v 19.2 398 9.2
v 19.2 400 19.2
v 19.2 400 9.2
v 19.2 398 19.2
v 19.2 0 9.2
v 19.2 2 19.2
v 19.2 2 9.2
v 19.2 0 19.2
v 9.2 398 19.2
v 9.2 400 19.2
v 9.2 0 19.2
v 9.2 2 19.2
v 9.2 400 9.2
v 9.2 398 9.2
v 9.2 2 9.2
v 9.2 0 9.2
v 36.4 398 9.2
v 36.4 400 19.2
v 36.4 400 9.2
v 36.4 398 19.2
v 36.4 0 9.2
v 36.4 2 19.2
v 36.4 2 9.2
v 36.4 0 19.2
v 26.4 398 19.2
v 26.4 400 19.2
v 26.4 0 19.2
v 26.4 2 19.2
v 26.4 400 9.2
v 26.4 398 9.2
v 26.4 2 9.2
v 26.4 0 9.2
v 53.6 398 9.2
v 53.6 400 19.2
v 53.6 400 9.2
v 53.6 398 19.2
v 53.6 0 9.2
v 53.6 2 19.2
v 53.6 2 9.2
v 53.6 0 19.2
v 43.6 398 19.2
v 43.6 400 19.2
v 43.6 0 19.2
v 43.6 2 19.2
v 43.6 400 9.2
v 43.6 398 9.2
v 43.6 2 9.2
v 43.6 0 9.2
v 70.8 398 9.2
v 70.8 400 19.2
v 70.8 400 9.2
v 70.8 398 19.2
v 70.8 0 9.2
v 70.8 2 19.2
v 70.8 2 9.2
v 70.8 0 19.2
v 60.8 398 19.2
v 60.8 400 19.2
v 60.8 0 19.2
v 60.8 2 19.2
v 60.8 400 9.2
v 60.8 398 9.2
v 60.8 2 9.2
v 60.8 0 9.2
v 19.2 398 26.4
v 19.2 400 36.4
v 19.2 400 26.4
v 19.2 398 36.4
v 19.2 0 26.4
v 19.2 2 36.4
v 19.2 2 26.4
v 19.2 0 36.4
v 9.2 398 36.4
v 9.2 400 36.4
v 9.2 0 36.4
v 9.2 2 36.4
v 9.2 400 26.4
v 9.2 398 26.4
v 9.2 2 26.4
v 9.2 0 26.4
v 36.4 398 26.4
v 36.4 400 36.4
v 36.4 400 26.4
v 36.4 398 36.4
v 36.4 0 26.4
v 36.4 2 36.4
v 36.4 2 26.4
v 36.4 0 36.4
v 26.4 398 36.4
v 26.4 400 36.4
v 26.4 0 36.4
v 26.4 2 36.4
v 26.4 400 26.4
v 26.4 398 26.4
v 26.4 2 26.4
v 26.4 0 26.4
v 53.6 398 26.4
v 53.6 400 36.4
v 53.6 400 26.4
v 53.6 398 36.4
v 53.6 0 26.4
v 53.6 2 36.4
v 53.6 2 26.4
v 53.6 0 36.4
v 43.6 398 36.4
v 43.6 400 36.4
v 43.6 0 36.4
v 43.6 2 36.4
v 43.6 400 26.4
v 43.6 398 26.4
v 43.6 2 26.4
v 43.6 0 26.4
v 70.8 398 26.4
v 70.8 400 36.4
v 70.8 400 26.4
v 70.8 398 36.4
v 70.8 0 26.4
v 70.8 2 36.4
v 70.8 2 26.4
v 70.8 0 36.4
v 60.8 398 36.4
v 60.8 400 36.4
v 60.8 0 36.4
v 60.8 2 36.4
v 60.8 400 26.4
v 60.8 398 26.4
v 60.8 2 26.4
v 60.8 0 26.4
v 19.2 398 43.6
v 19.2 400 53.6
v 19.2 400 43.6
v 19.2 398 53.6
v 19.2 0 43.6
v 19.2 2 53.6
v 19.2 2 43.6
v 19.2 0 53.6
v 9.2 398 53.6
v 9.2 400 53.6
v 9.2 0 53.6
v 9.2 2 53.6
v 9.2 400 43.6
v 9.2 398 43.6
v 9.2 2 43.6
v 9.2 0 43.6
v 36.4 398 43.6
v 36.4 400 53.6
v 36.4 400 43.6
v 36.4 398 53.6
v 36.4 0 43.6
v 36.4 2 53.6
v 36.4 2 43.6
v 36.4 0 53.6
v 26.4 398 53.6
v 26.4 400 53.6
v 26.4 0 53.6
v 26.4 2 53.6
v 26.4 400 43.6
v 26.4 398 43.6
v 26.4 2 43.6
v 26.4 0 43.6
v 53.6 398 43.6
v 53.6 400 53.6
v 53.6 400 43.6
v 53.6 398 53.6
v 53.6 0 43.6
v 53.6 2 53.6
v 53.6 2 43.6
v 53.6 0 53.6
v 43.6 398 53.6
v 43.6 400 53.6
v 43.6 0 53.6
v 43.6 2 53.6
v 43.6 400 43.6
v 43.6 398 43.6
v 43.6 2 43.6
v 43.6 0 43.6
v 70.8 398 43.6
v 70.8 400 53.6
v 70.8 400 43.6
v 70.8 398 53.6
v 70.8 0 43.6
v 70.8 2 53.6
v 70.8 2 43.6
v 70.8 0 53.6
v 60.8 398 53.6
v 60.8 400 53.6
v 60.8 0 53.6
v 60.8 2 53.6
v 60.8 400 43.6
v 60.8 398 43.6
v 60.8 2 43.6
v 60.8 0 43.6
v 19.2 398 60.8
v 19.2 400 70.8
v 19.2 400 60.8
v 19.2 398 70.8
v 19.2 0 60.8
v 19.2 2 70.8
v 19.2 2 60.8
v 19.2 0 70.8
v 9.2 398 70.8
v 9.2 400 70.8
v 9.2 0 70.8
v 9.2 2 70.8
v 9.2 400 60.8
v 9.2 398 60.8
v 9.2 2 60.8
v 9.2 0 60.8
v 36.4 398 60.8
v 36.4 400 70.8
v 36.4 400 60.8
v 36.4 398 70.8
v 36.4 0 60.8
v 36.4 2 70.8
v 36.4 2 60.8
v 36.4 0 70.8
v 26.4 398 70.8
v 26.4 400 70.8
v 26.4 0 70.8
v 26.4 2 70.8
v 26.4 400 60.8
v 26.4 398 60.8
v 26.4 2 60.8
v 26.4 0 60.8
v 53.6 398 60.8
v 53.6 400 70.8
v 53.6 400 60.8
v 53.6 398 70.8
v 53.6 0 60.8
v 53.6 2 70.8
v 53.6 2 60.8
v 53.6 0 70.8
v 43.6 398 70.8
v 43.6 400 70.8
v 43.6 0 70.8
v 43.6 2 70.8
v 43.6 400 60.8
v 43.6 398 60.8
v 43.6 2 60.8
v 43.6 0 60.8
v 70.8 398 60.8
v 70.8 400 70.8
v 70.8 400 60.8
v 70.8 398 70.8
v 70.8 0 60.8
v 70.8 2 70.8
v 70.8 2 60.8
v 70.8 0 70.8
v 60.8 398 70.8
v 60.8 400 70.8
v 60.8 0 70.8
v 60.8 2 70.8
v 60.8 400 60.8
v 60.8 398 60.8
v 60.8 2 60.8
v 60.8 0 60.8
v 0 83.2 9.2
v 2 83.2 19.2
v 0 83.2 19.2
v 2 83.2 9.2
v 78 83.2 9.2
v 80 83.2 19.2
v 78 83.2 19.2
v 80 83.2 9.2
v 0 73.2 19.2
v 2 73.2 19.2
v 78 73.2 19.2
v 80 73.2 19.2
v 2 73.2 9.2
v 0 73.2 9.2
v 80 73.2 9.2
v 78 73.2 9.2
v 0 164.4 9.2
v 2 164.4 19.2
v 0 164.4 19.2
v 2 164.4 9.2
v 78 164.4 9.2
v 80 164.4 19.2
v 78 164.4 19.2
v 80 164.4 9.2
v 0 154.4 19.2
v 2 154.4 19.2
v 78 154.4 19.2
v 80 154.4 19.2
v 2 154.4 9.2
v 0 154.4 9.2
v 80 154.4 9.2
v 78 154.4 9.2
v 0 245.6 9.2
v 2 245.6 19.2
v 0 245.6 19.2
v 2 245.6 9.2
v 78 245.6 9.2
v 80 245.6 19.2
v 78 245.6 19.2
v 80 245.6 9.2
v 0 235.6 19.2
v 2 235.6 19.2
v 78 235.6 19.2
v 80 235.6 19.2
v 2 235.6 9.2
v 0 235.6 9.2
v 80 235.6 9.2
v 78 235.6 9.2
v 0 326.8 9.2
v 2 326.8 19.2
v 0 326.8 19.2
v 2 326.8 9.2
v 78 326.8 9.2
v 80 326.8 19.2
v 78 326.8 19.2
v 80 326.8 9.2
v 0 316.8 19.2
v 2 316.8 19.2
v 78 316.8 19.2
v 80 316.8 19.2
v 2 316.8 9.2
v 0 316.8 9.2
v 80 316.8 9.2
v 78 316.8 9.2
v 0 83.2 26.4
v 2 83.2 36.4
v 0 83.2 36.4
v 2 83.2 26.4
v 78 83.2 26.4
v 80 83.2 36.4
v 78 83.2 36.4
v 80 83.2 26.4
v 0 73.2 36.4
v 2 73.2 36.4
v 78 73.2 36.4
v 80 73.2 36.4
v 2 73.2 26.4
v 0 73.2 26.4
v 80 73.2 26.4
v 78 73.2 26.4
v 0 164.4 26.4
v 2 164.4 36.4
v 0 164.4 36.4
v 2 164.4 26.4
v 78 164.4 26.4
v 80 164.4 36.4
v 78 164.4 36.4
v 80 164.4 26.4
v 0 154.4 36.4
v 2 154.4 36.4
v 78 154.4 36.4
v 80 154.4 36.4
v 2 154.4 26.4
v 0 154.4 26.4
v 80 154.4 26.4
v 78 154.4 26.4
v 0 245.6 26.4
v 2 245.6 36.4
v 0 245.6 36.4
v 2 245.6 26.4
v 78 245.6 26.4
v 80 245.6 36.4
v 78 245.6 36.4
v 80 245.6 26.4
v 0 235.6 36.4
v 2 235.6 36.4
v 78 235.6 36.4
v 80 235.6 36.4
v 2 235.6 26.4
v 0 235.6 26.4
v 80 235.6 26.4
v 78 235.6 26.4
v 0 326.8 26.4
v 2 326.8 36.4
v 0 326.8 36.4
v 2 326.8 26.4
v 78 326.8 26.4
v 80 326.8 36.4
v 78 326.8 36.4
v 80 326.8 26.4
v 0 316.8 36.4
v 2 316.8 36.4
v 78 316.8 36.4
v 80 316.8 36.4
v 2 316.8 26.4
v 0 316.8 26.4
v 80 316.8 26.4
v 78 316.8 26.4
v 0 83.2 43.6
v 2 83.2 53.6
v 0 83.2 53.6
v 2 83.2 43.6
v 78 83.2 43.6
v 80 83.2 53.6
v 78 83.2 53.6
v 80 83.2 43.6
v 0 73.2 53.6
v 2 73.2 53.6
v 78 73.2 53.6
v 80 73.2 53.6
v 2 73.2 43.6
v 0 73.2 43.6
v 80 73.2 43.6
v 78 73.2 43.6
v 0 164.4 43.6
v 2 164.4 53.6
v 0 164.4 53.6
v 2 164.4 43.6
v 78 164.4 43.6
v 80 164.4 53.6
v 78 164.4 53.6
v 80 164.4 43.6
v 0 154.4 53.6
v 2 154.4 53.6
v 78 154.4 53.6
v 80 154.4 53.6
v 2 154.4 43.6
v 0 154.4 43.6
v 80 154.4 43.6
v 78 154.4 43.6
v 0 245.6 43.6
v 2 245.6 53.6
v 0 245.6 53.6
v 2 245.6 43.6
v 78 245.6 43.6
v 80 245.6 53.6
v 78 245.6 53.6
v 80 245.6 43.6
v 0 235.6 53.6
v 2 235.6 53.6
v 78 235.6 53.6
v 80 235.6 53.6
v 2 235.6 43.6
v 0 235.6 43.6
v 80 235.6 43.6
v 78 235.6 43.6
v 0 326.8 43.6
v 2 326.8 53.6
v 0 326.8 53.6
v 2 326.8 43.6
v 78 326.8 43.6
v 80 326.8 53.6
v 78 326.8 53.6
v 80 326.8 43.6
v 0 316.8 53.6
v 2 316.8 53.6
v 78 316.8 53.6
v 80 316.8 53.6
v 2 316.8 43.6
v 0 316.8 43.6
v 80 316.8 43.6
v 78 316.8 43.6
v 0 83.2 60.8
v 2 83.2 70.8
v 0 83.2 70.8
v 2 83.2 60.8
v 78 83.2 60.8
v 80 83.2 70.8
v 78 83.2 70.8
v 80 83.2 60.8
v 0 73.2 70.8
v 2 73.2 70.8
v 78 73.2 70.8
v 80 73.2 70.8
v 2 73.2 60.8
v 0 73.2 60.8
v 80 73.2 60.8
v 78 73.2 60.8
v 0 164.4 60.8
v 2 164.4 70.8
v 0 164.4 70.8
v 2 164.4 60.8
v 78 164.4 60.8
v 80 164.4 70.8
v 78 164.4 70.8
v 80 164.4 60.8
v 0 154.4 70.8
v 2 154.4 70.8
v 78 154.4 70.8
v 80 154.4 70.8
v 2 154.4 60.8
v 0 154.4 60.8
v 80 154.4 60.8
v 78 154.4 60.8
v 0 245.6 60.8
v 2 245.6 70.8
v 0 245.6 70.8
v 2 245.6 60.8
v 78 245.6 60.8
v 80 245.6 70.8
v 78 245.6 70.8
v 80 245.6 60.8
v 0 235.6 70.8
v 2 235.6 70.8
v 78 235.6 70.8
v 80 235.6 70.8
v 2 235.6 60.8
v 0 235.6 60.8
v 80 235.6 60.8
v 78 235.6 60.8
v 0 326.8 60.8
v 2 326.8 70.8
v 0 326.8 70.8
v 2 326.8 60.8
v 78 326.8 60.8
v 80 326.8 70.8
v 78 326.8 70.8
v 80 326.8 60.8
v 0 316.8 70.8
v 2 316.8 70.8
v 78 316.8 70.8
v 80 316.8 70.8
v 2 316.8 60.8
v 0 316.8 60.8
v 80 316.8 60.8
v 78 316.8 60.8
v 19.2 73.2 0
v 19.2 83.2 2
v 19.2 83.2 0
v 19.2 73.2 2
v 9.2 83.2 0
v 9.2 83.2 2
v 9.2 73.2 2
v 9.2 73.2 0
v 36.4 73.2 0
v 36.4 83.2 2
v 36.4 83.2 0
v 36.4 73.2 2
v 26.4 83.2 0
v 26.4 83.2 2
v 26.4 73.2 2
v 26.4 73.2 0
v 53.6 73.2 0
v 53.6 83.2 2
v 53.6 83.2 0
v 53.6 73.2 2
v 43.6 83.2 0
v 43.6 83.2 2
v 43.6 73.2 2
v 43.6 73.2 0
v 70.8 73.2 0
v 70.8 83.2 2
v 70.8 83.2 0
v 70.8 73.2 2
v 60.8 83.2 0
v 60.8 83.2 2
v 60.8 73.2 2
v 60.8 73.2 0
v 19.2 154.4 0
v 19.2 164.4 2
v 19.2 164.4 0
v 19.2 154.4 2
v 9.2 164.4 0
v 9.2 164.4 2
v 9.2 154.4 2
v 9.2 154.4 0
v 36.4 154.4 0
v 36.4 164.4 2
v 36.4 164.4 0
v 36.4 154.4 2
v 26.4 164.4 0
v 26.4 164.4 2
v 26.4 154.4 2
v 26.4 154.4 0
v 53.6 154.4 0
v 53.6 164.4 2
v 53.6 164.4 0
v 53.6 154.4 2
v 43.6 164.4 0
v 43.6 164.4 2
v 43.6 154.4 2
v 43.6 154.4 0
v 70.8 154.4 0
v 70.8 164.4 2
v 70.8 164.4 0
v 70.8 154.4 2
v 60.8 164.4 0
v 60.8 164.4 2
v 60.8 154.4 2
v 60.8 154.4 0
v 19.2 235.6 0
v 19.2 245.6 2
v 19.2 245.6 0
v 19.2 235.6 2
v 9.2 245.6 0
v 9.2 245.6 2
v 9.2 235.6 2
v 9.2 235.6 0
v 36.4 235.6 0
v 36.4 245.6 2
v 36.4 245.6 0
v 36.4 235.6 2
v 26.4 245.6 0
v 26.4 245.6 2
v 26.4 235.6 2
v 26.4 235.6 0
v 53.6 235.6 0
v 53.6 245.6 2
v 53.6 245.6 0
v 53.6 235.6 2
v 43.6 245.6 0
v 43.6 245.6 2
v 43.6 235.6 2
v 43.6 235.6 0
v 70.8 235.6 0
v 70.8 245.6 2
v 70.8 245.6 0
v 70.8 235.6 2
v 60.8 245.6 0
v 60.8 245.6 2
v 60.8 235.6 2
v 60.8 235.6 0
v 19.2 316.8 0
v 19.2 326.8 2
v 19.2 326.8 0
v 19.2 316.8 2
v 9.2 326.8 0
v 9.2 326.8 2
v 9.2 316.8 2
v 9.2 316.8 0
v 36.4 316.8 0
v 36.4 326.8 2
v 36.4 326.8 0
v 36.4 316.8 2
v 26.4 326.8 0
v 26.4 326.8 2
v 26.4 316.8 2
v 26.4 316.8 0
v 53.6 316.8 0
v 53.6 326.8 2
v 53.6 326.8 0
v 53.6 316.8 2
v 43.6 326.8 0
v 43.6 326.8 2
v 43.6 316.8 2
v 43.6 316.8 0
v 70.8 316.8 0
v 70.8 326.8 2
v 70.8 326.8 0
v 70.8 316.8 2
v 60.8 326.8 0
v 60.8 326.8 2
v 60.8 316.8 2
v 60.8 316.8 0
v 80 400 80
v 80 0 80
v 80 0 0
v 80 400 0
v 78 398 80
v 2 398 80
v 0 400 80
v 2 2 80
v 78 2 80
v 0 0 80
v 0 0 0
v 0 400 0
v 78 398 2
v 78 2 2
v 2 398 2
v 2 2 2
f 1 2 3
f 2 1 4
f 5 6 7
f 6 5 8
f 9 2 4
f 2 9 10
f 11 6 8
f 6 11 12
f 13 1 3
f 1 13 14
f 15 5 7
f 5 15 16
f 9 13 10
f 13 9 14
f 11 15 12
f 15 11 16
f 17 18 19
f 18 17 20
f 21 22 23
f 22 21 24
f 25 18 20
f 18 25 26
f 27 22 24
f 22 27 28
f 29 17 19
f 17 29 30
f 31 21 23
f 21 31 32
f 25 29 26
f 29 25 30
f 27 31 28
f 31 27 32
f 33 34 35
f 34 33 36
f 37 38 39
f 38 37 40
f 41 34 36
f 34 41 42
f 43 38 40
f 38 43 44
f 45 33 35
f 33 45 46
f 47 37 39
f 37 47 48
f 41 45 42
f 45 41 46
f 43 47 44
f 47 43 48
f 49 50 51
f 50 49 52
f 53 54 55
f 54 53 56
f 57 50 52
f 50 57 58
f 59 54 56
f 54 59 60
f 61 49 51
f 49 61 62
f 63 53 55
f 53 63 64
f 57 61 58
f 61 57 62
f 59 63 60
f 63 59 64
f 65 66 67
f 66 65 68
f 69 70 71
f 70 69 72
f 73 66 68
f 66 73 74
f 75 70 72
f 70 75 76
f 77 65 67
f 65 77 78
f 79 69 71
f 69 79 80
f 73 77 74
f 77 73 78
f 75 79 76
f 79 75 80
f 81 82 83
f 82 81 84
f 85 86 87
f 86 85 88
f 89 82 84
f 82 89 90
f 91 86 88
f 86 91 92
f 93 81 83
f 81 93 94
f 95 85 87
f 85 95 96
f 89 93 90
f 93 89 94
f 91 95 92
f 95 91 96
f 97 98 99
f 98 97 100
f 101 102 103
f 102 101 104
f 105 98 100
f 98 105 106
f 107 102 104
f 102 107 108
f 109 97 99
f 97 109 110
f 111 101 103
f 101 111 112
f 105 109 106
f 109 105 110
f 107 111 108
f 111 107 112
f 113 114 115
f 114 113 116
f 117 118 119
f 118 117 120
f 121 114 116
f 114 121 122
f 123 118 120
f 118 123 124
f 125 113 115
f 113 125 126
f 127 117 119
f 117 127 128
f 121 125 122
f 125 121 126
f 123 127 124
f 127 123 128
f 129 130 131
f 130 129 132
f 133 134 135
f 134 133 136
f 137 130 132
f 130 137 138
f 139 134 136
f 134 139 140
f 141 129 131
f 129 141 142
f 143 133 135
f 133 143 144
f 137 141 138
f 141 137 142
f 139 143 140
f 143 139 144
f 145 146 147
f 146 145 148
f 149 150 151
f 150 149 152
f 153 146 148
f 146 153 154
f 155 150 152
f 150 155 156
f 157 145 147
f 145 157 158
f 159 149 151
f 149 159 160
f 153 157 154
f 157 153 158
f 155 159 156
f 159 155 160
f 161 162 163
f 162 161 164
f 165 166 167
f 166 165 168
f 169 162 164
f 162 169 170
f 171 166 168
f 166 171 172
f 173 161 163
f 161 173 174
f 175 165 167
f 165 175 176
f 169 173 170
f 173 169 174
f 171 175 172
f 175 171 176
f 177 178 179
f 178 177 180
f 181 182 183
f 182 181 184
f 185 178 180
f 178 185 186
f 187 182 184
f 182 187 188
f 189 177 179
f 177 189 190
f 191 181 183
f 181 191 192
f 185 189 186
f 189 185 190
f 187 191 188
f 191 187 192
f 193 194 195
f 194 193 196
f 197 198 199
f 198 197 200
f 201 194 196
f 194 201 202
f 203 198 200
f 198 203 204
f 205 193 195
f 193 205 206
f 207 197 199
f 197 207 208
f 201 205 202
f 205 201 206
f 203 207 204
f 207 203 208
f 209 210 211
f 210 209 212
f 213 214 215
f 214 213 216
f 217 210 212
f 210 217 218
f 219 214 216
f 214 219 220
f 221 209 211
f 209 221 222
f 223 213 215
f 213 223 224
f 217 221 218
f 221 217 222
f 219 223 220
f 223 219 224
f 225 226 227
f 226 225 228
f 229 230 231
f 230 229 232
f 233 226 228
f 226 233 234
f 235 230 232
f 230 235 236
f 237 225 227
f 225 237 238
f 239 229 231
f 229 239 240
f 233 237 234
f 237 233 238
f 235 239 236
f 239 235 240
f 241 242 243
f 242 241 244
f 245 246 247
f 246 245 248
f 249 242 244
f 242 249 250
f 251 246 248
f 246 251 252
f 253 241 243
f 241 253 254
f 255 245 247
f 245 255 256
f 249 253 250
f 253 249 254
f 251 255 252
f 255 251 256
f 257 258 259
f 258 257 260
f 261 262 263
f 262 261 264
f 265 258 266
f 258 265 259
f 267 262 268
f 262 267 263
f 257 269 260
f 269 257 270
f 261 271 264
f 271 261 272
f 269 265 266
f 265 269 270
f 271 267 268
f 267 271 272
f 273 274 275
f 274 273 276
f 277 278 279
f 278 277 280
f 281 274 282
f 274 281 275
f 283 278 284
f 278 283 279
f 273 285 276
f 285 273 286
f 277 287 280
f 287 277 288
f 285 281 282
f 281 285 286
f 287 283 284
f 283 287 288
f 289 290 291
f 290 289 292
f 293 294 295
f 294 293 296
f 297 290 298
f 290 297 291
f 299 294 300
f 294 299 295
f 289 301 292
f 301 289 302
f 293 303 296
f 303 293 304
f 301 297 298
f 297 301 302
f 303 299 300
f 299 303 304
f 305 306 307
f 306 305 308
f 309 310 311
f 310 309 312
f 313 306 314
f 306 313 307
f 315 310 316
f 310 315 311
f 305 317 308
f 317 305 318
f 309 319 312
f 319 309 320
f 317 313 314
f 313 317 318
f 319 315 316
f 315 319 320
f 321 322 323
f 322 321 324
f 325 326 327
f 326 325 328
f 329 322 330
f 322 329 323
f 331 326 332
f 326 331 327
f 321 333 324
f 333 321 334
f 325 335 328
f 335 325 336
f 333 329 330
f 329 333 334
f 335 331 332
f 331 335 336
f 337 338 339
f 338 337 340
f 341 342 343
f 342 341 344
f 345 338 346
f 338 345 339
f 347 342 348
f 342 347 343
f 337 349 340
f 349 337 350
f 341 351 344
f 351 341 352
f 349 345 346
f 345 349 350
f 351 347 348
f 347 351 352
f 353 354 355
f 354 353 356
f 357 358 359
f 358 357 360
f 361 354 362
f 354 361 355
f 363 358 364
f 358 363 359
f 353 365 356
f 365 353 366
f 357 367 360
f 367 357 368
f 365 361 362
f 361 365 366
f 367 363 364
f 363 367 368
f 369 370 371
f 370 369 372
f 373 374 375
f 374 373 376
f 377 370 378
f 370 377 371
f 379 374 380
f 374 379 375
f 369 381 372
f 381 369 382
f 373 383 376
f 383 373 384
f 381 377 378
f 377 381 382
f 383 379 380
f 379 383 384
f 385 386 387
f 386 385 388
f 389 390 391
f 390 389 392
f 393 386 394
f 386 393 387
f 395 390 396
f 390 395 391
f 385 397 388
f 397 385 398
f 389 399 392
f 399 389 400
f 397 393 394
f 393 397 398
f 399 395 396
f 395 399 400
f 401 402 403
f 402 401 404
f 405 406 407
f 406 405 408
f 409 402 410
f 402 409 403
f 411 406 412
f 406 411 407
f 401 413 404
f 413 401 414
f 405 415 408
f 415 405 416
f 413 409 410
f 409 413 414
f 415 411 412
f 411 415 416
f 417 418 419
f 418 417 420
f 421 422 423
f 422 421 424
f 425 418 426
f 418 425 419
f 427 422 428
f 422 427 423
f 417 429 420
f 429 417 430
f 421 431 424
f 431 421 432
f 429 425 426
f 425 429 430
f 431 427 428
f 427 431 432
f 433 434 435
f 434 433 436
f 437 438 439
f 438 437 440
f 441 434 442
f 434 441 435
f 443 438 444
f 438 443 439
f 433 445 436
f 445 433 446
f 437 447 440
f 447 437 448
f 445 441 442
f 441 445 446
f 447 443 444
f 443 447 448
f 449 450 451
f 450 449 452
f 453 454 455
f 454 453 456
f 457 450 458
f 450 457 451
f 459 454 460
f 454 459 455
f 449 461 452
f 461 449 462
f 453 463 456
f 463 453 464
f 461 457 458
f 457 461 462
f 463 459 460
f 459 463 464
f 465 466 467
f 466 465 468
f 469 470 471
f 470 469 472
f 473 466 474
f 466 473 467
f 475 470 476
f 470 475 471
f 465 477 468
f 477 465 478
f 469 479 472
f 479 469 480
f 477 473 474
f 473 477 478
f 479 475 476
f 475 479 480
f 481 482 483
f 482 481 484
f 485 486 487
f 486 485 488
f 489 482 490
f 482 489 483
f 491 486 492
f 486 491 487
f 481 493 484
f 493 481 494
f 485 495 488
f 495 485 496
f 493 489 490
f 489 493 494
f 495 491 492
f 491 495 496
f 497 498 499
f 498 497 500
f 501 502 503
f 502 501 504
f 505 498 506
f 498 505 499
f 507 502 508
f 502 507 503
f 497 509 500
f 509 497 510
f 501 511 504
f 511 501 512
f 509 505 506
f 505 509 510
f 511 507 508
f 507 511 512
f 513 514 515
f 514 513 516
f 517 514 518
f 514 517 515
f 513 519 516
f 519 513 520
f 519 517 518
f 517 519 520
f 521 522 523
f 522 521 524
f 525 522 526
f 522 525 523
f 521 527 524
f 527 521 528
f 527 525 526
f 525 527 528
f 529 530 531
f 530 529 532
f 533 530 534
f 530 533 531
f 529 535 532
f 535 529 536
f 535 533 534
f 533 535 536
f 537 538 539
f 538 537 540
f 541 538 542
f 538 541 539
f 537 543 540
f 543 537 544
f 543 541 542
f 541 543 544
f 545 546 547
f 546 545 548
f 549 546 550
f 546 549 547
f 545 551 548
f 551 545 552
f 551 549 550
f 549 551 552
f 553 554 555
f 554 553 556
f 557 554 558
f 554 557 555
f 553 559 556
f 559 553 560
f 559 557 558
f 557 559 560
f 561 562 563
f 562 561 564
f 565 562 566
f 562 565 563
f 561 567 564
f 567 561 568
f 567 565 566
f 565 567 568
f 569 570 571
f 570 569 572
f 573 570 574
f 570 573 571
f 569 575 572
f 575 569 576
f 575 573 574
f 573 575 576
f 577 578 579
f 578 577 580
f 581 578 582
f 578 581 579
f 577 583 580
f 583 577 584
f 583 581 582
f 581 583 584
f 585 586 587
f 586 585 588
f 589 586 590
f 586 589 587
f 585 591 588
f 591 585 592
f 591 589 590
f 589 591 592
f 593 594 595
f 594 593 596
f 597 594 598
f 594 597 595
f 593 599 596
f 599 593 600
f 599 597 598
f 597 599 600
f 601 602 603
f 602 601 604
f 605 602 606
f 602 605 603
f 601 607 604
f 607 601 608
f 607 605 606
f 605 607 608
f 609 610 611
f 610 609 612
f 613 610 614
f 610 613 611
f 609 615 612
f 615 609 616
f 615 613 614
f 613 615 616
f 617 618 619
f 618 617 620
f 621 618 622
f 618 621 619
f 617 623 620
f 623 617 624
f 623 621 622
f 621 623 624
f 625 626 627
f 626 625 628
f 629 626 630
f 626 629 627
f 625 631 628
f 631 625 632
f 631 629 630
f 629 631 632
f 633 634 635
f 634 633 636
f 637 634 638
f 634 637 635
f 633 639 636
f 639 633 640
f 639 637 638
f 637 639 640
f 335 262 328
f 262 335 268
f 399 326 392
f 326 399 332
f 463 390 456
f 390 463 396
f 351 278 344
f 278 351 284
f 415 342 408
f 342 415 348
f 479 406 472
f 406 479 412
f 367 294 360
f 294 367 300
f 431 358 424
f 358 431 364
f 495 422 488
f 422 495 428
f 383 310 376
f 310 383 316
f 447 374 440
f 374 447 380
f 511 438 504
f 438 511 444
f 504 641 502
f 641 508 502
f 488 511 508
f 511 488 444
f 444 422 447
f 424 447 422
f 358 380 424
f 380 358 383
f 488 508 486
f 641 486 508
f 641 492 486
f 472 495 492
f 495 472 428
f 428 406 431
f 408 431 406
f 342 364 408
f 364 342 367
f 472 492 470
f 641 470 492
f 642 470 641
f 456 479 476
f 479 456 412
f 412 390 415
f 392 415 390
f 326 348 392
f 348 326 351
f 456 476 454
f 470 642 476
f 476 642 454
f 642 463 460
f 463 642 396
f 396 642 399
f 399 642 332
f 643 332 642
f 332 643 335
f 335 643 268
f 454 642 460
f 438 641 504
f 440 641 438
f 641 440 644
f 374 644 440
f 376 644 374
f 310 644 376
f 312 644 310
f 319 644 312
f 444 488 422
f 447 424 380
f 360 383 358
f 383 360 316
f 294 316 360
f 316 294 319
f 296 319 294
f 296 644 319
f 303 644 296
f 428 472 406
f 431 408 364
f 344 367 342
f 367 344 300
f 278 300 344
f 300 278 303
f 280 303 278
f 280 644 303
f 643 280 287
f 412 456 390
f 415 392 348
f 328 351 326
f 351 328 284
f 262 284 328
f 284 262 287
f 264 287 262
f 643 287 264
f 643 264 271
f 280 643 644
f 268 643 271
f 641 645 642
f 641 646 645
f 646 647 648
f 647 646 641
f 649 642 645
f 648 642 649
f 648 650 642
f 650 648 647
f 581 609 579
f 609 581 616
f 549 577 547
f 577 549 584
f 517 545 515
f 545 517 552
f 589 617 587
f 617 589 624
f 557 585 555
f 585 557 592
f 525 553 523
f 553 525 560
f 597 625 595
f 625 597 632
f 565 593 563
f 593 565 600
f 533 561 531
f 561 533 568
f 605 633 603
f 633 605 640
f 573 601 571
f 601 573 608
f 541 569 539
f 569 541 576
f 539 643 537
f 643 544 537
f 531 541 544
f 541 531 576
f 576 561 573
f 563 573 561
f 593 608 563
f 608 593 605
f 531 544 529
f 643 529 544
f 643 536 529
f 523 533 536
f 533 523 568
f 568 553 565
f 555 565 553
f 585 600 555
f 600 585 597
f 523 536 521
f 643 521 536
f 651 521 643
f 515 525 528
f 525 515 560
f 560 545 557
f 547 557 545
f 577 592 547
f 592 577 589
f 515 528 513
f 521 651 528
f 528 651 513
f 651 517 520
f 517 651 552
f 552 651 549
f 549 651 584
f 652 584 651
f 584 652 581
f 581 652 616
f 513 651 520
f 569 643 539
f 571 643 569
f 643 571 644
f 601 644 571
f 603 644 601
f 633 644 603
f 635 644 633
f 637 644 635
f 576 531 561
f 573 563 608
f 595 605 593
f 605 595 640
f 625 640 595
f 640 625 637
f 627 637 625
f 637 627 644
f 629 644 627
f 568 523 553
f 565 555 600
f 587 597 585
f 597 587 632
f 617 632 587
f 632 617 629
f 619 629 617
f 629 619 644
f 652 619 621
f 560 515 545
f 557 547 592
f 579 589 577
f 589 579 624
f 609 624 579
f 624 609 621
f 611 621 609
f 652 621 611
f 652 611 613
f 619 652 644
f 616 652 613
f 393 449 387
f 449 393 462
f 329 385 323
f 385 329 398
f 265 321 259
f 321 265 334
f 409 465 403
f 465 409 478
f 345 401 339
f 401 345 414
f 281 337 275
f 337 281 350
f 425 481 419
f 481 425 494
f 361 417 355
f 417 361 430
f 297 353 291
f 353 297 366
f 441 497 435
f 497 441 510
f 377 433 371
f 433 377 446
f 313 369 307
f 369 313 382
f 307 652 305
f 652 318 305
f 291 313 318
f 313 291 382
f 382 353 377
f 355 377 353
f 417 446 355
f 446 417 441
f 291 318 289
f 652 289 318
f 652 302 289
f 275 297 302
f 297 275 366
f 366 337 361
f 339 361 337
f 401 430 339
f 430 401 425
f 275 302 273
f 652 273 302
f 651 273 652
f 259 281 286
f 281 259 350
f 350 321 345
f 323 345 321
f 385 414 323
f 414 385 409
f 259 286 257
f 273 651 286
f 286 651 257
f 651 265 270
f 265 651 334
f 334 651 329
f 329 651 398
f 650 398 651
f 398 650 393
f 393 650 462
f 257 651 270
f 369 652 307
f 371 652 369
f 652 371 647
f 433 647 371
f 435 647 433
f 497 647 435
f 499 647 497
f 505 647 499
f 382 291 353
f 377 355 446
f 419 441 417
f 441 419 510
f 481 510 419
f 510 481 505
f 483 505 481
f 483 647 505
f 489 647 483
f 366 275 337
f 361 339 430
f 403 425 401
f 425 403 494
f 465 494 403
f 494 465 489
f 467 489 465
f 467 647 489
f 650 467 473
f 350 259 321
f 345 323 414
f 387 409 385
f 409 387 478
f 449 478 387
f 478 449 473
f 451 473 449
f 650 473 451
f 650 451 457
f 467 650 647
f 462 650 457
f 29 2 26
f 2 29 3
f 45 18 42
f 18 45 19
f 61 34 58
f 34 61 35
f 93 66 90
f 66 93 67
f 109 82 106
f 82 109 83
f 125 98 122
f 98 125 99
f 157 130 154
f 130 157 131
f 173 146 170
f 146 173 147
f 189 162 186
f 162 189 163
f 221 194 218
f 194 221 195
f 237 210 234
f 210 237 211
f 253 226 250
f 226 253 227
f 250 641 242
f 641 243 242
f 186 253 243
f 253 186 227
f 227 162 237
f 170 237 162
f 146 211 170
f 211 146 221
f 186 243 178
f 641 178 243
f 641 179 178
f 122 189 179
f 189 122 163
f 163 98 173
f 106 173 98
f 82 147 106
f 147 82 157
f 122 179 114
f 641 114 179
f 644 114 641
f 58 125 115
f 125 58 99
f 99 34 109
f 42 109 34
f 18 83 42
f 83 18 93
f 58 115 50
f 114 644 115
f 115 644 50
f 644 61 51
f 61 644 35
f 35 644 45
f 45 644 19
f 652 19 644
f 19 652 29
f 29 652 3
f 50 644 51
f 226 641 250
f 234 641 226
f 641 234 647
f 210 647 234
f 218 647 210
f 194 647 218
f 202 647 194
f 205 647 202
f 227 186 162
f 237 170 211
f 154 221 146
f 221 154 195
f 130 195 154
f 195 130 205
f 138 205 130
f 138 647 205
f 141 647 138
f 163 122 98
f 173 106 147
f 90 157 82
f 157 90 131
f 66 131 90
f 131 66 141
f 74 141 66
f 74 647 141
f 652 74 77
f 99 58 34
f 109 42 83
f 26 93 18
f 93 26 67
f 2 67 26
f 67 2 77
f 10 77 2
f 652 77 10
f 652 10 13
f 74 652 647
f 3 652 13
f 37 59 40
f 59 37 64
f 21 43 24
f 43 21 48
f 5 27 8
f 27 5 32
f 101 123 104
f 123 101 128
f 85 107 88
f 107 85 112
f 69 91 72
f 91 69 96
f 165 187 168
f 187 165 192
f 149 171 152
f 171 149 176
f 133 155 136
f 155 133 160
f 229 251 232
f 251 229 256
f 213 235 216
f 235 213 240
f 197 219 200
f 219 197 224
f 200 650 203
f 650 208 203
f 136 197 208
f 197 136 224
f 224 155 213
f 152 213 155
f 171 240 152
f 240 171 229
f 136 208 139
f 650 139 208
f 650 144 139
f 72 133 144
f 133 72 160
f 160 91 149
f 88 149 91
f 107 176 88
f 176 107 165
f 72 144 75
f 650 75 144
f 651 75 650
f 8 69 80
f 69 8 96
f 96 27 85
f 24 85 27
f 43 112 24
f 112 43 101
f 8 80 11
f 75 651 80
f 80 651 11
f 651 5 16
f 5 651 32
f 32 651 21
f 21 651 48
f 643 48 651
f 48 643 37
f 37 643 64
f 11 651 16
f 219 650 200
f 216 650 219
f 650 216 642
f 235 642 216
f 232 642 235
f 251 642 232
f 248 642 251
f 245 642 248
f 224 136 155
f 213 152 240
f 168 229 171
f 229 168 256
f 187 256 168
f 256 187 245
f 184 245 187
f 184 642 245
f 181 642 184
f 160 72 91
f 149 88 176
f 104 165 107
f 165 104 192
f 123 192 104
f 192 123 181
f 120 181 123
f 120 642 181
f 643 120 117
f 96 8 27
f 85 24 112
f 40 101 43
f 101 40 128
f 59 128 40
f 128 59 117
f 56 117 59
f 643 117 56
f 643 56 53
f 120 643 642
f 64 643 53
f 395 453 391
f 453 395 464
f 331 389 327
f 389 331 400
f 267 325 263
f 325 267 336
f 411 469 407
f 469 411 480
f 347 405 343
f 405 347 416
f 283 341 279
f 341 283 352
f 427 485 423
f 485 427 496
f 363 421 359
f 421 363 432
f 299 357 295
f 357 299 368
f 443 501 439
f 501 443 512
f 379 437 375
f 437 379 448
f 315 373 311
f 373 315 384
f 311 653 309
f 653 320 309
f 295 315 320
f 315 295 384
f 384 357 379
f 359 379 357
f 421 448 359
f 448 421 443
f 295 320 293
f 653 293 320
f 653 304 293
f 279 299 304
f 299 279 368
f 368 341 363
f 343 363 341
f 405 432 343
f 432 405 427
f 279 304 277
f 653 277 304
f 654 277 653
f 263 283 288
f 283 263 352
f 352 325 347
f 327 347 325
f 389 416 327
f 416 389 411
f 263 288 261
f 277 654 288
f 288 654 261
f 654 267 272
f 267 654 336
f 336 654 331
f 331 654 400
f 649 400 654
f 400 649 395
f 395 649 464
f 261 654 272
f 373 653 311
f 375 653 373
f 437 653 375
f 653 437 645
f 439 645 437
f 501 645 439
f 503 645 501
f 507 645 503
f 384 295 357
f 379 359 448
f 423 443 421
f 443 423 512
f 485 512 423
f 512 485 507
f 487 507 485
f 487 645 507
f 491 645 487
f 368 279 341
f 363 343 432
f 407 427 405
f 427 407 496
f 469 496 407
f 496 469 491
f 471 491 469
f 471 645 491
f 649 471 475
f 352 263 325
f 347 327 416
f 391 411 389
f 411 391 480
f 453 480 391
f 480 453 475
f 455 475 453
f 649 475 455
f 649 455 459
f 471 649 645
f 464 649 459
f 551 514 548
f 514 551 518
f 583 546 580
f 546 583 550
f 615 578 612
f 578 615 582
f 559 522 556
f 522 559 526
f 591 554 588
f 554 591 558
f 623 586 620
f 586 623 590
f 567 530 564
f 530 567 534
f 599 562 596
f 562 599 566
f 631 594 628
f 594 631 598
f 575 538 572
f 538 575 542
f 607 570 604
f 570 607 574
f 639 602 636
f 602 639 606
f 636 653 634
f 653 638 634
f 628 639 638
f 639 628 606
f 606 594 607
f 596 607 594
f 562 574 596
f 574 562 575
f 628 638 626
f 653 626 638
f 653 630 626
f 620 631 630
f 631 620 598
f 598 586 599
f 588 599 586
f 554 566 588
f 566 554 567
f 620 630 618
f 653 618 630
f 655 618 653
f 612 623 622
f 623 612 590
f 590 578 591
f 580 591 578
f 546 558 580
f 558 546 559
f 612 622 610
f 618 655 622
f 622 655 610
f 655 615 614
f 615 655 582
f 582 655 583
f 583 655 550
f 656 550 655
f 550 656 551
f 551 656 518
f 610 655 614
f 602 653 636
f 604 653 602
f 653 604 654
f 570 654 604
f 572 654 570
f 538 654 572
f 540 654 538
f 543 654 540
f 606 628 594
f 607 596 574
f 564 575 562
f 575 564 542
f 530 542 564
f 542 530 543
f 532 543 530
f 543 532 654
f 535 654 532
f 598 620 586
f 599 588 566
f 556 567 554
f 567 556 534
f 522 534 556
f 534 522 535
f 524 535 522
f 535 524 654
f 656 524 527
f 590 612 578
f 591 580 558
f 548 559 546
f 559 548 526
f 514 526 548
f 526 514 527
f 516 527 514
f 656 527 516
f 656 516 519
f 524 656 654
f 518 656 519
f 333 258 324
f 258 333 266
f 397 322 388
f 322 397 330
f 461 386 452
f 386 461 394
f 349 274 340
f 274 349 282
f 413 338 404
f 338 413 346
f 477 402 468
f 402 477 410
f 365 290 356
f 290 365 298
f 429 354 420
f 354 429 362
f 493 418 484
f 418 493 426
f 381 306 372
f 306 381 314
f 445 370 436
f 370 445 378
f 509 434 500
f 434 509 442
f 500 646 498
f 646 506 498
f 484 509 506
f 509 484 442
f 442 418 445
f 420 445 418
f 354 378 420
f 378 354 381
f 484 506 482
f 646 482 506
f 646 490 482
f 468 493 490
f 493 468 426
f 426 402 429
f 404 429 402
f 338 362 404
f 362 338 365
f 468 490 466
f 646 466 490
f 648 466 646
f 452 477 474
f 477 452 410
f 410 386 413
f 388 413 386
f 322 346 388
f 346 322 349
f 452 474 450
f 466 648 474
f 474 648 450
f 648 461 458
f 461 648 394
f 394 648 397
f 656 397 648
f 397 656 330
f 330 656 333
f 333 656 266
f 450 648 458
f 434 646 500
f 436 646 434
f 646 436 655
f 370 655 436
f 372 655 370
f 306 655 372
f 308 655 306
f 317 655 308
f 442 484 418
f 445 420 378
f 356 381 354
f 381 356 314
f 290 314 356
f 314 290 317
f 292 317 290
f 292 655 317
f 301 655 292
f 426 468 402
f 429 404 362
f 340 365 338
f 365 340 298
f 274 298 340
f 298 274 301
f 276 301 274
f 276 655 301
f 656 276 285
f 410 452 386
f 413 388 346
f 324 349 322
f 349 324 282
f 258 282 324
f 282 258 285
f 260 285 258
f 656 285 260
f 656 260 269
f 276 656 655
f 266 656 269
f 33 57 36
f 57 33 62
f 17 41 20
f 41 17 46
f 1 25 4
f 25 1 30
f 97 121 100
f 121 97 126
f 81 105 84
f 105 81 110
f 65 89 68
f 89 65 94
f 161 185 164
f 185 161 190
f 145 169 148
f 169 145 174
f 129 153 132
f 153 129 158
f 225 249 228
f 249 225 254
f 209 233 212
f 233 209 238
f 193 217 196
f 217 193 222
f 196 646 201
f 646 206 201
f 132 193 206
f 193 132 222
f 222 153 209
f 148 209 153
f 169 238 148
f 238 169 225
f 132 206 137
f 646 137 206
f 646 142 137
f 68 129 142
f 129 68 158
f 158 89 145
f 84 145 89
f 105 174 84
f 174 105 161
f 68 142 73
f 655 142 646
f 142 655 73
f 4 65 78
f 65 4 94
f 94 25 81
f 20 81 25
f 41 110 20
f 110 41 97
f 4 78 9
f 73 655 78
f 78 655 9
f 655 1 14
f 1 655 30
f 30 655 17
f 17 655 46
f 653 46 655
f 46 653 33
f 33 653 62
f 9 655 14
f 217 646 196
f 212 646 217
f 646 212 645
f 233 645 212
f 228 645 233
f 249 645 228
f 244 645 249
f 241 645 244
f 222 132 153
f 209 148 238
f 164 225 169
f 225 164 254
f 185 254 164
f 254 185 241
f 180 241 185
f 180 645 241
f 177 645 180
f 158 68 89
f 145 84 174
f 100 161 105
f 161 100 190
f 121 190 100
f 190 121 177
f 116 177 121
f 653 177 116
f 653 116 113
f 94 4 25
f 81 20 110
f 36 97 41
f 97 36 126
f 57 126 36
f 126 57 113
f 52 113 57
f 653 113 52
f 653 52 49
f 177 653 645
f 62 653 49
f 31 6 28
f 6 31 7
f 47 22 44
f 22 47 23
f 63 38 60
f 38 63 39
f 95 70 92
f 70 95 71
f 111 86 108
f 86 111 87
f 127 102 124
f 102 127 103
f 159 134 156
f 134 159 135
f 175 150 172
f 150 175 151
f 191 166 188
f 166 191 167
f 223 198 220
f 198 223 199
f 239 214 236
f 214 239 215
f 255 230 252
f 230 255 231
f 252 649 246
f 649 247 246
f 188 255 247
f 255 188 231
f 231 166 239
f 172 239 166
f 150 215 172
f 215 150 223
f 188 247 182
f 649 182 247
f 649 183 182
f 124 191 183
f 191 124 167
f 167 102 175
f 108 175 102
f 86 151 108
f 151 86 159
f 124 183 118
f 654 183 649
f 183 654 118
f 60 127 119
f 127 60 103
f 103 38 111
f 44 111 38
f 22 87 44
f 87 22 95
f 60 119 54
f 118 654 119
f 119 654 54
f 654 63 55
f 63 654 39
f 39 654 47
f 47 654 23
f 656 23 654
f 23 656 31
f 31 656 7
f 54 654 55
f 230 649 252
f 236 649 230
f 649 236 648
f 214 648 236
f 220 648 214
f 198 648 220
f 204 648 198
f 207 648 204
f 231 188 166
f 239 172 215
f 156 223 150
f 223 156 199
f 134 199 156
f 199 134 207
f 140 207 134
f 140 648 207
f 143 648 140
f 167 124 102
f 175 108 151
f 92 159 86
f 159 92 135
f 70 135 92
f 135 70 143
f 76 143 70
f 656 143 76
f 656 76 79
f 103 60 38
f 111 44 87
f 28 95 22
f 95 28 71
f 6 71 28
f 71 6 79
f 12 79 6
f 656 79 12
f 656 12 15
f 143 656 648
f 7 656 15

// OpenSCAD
// Main solid dimensions
CubeWidth=80;
CubeDepth=400;
CubeHeight=80;
BorderWidth=2;

// Choose on which faces you want the holes. 1 for YES and 0 for NO
HolesFront=1;
HolesLateral=1;
HolesBottom=1;

// Holes in the main solid
HoleWidth=10;
HoleHeight=10;
HorizontalHoleNumber=4;
VerticalHoleNumber=4;

// Calculates space among holes
WidthSpace=((CubeWidth - BorderWidth * 2) - (HoleWidth * HorizontalHoleNumber)) /(HorizontalHoleNumber + 1) ;
DepthSpace=((CubeDepth - BorderWidth * 2) - (HoleWidth * HorizontalHoleNumber)) /(HorizontalHoleNumber + 1) ;
HeightSpace=((CubeHeight - BorderWidth * 2) - (HoleHeight * VerticalHoleNumber)) / (VerticalHoleNumber + 1);


echo("");
echo("");
echo (DepthSpace);
echo("");
echo("");

// Draw the solid
difference () {

	// Draw main solid
	cube ([CubeWidth, CubeDepth, CubeHeight]);
	// Empty main solid with a smaller inner solid
	translate ([BorderWidth, BorderWidth, BorderWidth])
	cube ([CubeWidth-2*BorderWidth, CubeDepth-2*BorderWidth, CubeHeight*1.5]);

	// Front and back holes
	if (HolesFront==1){
		for (z = [0 : VerticalHoleNumber - 1])
		{
		for (x = [0 : HorizontalHoleNumber -1 ])
		{
		translate ([BorderWidth + WidthSpace + (HoleWidth + WidthSpace) * x , -10, BorderWidth +  HeightSpace + (HoleHeight + HeightSpace) * z])
		cube ([HoleWidth, CubeDepth * 1.4, HoleHeight]);
		}
		}
	}
	
	// Lateral holes
	if (HolesLateral==1) {
		rotate ([0,0,90])
		translate ([0, -CubeWidth * 1.2, 0])
		for (z = [0 : VerticalHoleNumber - 1])
		{
		for (x = [0 : HorizontalHoleNumber -1 ])
		{
		translate ([BorderWidth + DepthSpace + (HoleWidth + DepthSpace) * x, -10, BorderWidth +  HeightSpace + (HoleHeight + HeightSpace) * z])
		cube ([HoleWidth, CubeWidth * 1.4, HoleHeight]);
		}
		}
	}

	// Bottom holes
	if (HolesBottom==1){
		rotate ([-90,0,0])
		translate ([0, -CubeWidth * 1.2, 0])
		for (z = [0 : HorizontalHoleNumber - 1])
		{
		for (x = [0 : HorizontalHoleNumber -1 ])
		{
		translate ([BorderWidth + WidthSpace + (HoleWidth + WidthSpace) * x , -10, BorderWidth +  DepthSpace + (HoleHeight + DepthSpace) * z])
		cube ([HoleWidth, CubeWidth * 1.4, HoleHeight]);
		}
		}
	}

}
